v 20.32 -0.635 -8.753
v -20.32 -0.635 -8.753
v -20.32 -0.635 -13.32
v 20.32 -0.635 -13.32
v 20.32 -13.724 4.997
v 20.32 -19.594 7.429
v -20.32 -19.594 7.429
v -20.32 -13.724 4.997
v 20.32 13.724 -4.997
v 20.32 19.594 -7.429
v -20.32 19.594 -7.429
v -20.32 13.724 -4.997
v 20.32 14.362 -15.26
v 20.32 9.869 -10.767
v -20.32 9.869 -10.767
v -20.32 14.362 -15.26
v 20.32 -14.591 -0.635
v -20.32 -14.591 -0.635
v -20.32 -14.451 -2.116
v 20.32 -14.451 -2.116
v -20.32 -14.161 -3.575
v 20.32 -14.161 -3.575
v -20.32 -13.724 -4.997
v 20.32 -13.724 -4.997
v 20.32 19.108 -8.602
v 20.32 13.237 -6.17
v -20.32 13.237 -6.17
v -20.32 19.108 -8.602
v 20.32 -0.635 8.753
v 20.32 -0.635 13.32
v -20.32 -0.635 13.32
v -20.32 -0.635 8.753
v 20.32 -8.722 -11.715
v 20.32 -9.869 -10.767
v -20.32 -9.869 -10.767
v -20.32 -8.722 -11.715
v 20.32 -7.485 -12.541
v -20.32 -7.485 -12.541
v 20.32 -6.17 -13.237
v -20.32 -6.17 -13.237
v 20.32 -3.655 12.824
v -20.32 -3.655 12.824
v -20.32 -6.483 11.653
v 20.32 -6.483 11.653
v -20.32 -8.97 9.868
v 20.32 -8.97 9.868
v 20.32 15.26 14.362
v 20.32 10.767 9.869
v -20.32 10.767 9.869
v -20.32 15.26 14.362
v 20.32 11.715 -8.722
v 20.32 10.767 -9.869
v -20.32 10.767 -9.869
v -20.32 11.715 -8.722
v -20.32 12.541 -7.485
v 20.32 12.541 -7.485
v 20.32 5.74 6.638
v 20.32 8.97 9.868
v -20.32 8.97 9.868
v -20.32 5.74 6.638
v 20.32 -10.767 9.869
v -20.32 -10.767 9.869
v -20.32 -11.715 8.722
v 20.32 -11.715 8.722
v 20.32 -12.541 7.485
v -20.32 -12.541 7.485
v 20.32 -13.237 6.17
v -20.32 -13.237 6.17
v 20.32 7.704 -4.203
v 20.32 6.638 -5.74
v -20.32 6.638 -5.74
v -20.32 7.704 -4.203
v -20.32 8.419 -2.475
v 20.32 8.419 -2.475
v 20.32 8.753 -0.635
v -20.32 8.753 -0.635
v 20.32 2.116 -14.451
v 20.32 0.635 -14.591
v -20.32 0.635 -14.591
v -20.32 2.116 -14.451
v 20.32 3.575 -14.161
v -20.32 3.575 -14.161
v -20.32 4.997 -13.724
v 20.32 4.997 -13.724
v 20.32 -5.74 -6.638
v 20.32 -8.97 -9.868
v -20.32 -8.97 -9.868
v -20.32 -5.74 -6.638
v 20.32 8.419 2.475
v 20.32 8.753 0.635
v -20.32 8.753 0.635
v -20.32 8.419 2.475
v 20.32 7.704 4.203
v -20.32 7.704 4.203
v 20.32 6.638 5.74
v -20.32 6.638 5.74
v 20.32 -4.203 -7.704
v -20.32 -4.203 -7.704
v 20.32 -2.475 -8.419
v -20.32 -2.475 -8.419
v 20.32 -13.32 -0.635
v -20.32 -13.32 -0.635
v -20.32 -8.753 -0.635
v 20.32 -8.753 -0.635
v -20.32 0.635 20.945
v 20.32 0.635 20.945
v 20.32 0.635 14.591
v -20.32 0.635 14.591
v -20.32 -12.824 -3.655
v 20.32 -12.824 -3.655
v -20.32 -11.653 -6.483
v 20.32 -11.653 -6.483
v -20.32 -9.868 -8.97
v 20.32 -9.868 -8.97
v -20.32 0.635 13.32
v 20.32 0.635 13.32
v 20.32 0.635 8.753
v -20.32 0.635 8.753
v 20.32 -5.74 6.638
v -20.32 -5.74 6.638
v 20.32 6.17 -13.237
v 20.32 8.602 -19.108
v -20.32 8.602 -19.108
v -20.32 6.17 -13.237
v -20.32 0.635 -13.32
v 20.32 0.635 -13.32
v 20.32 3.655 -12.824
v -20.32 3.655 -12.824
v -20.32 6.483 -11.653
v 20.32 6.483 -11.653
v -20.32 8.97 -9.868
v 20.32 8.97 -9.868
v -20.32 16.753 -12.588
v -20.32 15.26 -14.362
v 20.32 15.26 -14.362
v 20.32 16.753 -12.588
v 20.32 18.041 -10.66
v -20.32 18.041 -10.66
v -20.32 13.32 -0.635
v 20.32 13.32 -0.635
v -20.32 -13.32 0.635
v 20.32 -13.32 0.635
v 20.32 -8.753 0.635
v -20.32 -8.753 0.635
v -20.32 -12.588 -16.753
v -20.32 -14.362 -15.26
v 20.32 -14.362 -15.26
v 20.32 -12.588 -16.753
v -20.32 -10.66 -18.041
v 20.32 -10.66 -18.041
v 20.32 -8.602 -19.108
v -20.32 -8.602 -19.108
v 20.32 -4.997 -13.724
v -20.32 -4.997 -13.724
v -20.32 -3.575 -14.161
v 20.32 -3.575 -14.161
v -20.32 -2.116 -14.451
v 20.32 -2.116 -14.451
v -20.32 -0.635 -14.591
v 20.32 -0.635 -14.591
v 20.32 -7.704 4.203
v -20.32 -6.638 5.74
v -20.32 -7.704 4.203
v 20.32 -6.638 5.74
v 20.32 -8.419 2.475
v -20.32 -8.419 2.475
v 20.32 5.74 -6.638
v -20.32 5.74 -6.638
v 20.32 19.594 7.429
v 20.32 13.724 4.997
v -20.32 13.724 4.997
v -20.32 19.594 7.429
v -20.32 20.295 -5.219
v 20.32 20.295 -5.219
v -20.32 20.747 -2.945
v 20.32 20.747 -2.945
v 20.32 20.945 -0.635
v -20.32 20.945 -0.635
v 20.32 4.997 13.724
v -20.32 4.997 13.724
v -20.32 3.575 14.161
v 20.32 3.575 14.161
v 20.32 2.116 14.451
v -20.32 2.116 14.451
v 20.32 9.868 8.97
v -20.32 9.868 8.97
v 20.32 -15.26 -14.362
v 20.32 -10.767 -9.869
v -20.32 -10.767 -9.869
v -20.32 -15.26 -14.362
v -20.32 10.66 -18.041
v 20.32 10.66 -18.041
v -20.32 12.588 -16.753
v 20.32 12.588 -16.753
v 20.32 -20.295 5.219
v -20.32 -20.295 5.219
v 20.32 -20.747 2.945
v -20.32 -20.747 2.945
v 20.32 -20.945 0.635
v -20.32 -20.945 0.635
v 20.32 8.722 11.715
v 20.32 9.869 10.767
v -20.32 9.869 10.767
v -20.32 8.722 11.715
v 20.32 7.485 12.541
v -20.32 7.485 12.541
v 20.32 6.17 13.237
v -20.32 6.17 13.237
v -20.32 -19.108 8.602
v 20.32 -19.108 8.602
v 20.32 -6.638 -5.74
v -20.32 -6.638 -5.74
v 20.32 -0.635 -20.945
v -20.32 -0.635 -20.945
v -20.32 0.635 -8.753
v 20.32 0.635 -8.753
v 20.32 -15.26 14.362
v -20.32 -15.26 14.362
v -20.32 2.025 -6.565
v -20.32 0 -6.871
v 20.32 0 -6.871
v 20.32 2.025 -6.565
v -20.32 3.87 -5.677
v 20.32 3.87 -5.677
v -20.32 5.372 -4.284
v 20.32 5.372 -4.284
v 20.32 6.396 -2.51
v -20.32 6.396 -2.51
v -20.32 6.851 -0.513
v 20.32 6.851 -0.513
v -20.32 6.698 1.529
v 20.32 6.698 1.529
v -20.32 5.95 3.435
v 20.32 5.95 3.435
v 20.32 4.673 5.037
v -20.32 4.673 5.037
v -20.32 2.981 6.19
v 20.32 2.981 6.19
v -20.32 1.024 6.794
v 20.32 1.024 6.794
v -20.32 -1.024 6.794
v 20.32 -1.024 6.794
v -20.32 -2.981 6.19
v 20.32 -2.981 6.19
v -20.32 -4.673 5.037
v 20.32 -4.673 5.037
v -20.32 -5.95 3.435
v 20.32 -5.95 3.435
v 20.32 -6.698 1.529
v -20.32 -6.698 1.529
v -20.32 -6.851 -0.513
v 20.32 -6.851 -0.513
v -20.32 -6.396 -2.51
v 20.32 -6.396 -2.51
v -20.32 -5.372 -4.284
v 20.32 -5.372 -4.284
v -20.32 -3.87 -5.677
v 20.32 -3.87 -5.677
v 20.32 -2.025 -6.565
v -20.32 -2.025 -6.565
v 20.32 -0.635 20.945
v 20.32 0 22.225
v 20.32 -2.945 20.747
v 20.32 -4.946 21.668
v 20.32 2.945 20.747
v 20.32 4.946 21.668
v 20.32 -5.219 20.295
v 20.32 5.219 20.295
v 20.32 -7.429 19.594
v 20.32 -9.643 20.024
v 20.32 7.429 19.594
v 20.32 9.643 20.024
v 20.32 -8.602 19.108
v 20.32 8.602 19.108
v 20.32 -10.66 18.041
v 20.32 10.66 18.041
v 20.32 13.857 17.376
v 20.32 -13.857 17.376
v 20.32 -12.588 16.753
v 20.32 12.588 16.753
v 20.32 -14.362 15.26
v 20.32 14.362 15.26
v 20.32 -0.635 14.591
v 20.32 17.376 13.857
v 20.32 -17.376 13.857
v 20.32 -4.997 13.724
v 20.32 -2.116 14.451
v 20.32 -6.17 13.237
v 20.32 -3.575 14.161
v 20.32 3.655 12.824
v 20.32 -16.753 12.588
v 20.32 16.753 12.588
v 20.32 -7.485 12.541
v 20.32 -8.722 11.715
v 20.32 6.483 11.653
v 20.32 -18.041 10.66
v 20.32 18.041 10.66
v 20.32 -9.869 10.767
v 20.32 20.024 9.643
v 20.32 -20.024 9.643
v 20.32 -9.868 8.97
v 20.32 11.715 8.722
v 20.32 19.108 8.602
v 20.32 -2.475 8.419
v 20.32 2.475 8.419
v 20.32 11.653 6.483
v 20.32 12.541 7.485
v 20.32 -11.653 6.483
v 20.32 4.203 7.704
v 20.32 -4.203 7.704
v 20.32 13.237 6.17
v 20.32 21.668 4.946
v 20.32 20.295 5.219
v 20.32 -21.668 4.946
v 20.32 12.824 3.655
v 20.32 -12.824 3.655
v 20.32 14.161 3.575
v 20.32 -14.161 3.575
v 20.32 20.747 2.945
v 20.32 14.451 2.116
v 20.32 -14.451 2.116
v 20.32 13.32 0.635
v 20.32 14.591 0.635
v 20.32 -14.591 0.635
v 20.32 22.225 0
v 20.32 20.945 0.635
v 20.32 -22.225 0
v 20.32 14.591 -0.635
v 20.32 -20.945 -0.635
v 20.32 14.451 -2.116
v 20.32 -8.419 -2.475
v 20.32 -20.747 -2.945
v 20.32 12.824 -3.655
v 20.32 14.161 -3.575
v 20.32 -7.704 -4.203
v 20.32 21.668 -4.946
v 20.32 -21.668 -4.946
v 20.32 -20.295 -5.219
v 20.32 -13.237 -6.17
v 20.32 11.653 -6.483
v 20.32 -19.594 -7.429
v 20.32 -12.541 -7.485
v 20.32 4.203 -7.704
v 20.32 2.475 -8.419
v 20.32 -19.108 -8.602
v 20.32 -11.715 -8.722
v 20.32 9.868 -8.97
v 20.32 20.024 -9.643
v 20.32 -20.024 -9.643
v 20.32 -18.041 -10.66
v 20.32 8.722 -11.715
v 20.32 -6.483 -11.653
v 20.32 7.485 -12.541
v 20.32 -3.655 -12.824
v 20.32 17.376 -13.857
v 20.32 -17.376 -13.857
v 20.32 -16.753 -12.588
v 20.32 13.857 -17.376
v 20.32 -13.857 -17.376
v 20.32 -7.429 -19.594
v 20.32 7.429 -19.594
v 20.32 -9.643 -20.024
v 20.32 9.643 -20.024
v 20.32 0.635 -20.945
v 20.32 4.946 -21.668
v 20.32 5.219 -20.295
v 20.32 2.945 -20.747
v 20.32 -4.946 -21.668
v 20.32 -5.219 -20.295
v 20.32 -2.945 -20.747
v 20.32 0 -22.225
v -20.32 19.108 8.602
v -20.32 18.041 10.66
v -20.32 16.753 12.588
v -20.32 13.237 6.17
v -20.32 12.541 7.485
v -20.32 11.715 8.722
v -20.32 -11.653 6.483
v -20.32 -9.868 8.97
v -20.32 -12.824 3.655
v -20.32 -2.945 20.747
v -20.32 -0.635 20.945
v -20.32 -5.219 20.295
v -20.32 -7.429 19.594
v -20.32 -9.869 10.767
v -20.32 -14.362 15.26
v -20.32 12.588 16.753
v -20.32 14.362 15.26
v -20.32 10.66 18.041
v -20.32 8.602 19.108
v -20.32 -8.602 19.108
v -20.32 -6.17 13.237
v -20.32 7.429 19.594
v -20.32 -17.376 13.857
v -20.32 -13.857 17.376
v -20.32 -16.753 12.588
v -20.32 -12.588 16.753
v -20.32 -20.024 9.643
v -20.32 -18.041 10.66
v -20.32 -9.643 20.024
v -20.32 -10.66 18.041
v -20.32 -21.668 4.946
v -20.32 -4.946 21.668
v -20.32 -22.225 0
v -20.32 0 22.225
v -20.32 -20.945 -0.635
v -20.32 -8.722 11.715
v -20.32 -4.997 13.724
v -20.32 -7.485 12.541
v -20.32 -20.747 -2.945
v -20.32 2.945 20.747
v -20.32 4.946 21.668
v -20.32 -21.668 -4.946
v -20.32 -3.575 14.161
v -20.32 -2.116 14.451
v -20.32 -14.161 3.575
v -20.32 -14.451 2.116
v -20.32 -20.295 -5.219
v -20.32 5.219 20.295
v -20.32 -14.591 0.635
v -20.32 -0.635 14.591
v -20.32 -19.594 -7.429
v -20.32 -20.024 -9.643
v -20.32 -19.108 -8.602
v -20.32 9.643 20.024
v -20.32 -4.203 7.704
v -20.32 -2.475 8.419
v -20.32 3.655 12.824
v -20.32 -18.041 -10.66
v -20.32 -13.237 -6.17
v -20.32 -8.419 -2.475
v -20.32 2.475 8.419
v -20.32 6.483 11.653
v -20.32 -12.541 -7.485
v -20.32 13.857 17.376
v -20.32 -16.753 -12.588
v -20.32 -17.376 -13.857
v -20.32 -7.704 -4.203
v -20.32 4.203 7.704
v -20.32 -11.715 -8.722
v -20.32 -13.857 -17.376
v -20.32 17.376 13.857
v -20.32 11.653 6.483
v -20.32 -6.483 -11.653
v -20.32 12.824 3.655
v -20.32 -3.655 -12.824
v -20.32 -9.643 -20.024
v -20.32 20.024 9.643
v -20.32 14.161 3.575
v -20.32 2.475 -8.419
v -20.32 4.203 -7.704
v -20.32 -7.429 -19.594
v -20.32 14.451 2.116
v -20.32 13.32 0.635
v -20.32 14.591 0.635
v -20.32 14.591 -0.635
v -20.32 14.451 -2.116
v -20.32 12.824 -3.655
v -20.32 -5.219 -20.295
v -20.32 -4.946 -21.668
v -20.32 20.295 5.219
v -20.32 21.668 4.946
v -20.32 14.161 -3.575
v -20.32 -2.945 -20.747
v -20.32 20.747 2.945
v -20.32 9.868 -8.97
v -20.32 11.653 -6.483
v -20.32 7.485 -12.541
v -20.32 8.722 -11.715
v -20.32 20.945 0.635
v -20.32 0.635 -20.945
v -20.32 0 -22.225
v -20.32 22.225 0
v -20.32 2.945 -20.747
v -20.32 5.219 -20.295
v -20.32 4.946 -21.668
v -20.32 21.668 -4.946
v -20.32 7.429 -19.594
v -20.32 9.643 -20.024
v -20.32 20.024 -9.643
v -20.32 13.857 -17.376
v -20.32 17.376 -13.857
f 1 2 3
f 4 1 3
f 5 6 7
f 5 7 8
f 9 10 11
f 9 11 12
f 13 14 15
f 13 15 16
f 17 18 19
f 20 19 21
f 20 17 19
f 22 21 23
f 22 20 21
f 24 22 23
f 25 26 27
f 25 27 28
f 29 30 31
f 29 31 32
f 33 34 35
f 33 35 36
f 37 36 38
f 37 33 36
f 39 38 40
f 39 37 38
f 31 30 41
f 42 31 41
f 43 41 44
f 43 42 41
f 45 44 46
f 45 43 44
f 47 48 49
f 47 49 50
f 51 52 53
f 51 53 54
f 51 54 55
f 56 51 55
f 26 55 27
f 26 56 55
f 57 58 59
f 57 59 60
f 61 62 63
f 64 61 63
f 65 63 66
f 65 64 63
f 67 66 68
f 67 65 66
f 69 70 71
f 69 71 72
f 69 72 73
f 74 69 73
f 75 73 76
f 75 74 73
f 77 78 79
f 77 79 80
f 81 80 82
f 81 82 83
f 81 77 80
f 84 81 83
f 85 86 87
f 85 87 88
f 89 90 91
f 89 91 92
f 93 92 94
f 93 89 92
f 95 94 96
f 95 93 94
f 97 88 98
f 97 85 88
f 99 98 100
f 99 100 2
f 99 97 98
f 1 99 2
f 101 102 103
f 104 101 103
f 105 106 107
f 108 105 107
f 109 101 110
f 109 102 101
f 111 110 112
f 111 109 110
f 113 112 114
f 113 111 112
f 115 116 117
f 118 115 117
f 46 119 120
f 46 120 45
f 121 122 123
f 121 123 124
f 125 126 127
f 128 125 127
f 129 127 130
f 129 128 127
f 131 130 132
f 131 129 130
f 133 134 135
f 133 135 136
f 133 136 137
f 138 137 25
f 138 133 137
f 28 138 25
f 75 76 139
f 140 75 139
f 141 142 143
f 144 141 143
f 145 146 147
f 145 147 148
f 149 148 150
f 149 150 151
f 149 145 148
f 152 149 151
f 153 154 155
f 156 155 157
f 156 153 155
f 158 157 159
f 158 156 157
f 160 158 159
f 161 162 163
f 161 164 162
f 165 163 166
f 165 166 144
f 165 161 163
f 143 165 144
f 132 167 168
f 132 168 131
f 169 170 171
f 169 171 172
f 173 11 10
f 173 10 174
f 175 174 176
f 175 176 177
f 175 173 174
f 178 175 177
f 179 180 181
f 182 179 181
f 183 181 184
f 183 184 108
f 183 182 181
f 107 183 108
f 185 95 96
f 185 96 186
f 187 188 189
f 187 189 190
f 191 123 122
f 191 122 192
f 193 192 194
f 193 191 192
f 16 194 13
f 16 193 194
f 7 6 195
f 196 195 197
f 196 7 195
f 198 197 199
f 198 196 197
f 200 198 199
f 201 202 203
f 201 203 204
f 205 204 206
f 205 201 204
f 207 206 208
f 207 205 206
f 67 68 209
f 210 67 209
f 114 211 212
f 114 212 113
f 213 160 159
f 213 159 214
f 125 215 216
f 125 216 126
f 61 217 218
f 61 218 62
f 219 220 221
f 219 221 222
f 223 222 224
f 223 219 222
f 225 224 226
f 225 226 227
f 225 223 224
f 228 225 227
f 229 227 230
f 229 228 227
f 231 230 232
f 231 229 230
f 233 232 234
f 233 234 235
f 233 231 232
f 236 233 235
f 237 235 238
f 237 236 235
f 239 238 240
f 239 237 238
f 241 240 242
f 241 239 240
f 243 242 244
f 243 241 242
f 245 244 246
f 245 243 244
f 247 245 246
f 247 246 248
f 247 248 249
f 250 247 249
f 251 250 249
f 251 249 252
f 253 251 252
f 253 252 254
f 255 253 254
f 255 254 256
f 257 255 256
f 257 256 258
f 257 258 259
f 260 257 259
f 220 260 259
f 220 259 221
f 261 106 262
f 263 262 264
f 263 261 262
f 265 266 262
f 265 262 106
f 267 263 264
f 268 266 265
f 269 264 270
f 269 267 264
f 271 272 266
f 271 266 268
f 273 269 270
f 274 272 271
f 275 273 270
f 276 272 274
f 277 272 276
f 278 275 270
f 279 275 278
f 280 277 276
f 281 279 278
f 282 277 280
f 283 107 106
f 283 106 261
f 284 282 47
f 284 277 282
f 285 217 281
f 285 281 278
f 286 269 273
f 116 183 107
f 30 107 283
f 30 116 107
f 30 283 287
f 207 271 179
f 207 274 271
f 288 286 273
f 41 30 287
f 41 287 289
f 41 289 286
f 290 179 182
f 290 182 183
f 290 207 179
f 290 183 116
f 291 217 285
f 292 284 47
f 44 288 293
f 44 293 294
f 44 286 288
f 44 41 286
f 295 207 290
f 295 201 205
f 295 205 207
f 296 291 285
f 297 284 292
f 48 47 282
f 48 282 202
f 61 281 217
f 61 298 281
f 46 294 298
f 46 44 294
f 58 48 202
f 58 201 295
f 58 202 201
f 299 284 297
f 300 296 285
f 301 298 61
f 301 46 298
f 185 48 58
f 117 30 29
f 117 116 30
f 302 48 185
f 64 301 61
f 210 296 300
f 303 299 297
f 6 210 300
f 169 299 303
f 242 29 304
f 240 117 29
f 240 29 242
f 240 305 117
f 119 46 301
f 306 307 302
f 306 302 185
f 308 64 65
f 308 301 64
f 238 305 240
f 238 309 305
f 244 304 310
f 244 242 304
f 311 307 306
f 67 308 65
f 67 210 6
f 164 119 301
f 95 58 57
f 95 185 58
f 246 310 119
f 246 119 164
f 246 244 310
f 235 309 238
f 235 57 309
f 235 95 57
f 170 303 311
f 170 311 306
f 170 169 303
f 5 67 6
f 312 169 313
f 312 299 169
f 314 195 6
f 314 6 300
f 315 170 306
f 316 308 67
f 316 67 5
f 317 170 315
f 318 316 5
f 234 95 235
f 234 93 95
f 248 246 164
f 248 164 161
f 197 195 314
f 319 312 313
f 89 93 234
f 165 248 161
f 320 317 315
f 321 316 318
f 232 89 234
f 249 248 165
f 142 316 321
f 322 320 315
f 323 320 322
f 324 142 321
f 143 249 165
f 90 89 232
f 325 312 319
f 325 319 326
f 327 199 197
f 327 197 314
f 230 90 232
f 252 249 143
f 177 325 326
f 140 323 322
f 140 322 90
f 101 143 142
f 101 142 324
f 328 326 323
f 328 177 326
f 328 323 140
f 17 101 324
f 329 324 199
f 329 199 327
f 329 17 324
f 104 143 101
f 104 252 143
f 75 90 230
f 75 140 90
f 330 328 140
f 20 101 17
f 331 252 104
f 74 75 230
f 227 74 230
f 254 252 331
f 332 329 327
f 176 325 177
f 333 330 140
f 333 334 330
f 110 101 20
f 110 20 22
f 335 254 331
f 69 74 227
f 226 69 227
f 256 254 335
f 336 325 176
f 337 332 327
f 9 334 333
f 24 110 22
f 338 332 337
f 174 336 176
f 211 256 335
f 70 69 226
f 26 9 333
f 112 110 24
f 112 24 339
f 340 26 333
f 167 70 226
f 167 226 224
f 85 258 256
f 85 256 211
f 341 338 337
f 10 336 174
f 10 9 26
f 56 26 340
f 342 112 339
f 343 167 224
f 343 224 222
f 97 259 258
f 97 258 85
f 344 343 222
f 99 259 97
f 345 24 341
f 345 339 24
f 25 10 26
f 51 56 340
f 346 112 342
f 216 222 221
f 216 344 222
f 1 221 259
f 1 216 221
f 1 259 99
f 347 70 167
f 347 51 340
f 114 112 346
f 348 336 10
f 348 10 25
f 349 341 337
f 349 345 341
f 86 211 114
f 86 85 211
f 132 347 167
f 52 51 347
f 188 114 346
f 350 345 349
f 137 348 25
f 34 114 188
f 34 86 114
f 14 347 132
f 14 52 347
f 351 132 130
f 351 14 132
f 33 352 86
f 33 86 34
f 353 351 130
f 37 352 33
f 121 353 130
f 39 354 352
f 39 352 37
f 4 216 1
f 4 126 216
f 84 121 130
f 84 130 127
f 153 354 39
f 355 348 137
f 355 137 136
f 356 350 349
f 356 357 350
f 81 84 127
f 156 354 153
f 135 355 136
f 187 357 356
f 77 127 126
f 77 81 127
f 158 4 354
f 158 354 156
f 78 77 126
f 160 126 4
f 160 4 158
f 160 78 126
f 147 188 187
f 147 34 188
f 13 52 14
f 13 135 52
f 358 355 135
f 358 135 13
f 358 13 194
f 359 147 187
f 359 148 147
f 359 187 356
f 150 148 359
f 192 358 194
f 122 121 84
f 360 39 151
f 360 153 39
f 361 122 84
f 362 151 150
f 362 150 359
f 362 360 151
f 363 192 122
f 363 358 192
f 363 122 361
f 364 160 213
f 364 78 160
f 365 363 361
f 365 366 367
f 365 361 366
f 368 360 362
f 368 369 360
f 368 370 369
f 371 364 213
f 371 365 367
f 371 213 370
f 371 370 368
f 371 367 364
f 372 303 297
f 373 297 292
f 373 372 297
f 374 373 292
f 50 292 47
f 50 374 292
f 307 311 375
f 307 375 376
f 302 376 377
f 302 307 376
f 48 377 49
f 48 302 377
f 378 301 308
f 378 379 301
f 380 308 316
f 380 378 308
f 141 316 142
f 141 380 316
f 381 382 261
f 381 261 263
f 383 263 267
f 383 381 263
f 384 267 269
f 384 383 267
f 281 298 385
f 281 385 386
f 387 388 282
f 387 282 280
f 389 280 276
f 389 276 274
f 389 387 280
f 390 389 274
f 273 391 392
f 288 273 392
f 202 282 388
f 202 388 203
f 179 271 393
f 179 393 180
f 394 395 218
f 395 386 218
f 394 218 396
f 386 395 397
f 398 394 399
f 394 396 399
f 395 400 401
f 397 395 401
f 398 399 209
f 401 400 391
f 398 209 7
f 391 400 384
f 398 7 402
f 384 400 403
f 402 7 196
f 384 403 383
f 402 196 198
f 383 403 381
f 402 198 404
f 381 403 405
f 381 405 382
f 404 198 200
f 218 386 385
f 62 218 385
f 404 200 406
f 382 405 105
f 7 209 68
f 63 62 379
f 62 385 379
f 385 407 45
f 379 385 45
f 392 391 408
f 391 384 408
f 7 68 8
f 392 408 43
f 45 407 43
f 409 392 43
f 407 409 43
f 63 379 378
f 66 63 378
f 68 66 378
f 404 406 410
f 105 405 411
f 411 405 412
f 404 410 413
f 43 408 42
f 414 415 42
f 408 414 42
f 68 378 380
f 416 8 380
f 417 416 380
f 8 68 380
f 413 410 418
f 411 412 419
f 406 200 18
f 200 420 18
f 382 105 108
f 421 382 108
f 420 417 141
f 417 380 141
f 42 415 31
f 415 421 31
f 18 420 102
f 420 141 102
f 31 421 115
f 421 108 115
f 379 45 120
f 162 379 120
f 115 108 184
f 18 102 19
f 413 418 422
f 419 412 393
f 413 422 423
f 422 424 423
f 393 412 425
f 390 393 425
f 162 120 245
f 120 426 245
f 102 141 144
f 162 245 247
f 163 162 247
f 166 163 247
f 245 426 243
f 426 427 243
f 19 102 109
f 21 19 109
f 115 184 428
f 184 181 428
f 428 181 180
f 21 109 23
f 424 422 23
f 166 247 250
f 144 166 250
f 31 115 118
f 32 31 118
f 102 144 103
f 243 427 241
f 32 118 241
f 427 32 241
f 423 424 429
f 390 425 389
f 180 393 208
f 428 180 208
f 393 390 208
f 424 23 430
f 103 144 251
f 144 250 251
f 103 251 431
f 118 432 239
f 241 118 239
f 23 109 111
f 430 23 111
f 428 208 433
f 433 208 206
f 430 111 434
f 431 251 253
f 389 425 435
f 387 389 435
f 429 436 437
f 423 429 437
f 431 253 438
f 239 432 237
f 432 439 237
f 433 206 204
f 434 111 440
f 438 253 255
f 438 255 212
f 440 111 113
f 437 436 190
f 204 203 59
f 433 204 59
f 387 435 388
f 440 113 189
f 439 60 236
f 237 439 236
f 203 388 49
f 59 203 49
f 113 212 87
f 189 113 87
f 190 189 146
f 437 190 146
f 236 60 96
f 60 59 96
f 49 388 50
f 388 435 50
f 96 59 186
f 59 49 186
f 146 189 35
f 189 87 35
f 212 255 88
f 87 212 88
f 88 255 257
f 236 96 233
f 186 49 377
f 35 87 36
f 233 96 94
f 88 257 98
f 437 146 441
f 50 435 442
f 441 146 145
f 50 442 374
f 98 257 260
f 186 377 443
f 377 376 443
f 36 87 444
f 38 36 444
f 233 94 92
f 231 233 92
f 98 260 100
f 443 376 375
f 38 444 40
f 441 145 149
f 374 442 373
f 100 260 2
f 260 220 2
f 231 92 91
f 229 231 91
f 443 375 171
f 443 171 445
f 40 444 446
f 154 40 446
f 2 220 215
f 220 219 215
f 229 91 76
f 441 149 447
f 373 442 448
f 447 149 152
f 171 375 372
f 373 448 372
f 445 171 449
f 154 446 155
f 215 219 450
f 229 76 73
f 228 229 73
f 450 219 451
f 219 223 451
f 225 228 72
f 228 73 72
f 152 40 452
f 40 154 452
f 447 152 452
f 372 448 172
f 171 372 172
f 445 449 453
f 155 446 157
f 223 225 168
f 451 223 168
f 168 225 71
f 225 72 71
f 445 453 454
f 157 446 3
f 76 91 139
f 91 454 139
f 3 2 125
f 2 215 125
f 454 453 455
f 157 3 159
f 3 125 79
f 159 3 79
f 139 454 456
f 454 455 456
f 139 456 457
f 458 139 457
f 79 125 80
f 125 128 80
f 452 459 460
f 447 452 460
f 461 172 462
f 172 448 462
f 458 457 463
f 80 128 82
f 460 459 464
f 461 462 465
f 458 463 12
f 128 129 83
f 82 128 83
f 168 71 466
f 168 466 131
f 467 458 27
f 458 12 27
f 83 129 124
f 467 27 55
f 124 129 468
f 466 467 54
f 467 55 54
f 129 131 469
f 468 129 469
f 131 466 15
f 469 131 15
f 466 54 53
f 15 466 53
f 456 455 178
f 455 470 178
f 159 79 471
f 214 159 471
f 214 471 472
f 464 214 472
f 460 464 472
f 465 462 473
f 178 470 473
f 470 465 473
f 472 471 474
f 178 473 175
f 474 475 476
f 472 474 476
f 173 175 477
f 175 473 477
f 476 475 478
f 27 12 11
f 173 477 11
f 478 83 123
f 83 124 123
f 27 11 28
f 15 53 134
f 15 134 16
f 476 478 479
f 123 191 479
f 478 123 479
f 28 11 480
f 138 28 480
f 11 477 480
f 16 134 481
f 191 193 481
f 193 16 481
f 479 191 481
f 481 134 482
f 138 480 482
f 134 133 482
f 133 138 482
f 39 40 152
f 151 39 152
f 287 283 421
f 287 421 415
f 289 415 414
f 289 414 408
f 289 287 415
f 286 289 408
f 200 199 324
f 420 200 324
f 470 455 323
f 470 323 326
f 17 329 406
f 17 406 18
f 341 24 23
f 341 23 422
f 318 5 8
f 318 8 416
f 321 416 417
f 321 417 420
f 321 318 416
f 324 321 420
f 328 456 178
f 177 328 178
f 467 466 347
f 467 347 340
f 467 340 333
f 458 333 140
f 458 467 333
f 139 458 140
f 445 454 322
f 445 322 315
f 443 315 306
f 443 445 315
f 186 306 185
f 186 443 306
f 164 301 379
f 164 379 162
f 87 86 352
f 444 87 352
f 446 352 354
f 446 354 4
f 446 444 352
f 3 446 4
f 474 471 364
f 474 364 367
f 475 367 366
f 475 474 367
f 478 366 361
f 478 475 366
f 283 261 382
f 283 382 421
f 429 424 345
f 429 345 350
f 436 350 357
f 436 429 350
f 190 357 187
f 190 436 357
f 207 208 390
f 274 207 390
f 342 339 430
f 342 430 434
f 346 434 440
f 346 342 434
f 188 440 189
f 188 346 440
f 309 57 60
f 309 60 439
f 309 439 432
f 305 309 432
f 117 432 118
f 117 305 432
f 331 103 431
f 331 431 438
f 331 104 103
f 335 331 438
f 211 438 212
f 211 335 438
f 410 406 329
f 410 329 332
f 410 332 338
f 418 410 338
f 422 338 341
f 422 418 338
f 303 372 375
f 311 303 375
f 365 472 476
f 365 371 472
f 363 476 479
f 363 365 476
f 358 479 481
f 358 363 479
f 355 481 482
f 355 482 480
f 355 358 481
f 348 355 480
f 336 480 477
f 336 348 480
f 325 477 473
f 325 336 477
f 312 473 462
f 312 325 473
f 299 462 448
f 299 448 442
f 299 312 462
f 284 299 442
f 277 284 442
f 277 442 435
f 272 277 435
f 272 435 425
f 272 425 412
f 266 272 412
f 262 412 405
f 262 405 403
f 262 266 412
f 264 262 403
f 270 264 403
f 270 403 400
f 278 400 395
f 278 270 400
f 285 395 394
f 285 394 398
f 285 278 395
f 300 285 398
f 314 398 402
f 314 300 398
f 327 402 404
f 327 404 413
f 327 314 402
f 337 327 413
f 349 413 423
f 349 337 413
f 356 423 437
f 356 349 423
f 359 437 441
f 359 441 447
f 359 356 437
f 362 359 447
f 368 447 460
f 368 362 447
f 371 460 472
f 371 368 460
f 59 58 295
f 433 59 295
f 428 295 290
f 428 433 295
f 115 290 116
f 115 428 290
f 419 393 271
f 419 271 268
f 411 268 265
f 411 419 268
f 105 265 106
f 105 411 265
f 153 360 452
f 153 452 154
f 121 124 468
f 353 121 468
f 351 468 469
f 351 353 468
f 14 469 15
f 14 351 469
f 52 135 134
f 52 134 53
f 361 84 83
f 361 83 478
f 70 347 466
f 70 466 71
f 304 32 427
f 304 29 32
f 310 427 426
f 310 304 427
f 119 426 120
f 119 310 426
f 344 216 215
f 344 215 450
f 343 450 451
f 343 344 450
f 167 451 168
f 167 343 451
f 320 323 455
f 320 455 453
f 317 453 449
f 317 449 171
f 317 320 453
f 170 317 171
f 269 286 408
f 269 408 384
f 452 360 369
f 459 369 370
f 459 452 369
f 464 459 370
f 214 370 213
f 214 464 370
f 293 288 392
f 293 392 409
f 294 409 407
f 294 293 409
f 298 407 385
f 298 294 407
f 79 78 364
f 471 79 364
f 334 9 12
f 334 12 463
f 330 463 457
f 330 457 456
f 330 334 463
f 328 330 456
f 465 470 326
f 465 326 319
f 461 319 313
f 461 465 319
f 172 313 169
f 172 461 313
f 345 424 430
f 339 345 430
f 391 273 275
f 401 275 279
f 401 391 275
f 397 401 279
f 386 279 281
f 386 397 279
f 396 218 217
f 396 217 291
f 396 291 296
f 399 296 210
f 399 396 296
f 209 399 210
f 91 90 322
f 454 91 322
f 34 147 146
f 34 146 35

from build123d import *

# Parameters (mm, degrees)
SKETCH1_R             = 22.225
SKETCH1_R_2           = 20.955
EXTRUDE_THIN1_DEPTH   = 20.32
SKETCH1_R_3           = 14.605
SKETCH1_R_4           = 13.335
EXTRUDE_THIN1_2_DEPTH = 20.32
SKETCH1_3_R           = 8.7757
SKETCH1_3_R_2         = 6.8707
EXTRUDE_THIN2_DEPTH   = 20.32
SKETCH2_W             = 1.27
SKETCH2_H             = 41.91
SKETCH2_W_2           = 41.91
SKETCH2_H_2           = 1.27
EXTRUDE_THIN3_DEPTH   = 20.32
SKETCH1_5_R           = 6.8707
CUT_EXTRUDE1_DEPTH    = 20.32
EXTRUDE_THIN6_DEPTH   = 20.32
CIRPATTERN1_COUNT     = 8


with BuildPart() as part:
    # Sketch1 → Extrude-Thin1 (new body, symmetric)
    with BuildSketch(Plane(origin=(0, 0, 0), x_dir=(0, 0, -1), z_dir=(1, 0, 0))):
        Circle(SKETCH1_R)
        Circle(SKETCH1_R_2, mode=Mode.SUBTRACT)
    extrude(amount=EXTRUDE_THIN1_DEPTH, both=True)



with BuildPart() as body_2:
    # Sketch1 → Extrude-Thin1 2 (new body, symmetric)
    with BuildSketch(Plane(origin=(0, 0, 0), x_dir=(0, 0, -1), z_dir=(1, 0, 0))):
        Circle(SKETCH1_R_3)
        Circle(SKETCH1_R_4, mode=Mode.SUBTRACT)
    extrude(amount=EXTRUDE_THIN1_2_DEPTH, both=True)


with BuildPart() as body_3:
    # Sketch1<3> → Extrude-Thin2 (new body, symmetric)
    with BuildSketch(Plane(origin=(0, 0, 0), x_dir=(0, 0, -1), z_dir=(1, 0, 0))):
        Circle(SKETCH1_3_R)
        Circle(SKETCH1_3_R_2, mode=Mode.SUBTRACT)
    extrude(amount=EXTRUDE_THIN2_DEPTH, both=True)


with BuildPart() as part_1:
    add(part.part)

    add(body_3.part)  # Extrude-Thin3 merges body 3
    # Sketch2 → Extrude-Thin3 (add, symmetric)
    with BuildSketch(Plane(origin=(0, 0, 0), x_dir=(0, 0, -1), z_dir=(1, 0, 0))):
        Rectangle(SKETCH2_W, SKETCH2_H)
        Rectangle(SKETCH2_W_2, SKETCH2_H_2)
        Polygon((-14.368409794, -15.266435406), (15.266435406, 14.368409794), (14.368409794, 15.266435406), (-15.266435406, -14.368409794), align=None)
        Polygon((-15.266435406, 14.368409794), (14.368409794, -15.266435406), (15.266435406, -14.368409794), (-14.368409794, 15.266435406), align=None)
    extrude(amount=EXTRUDE_THIN3_DEPTH, both=True)

    # Sketch1<5> → Cut-Extrude1 (cut, symmetric)
    with BuildSketch(Plane(origin=(0, 0, 0), x_dir=(0, 0, -1), z_dir=(1, 0, 0))):
        Circle(SKETCH1_5_R)
    extrude(amount=CUT_EXTRUDE1_DEPTH, both=True, mode=Mode.SUBTRACT)


    add(body_2.part)  # Extrude-Thin6 merges body 2
    # Sketch4 → Extrude-Thin6 (add, symmetric)
    with BuildSketch(Plane(origin=(0, 0, 0), x_dir=(0, 0, -1), z_dir=(1, 0, 0))):
        Polygon((-8.605794828, 19.116891624), (-5.981351849, 12.78092579), (-4.808024843, 13.266933749), (-7.432467822, 19.602899583), align=None)
    extrude_thin6 = extrude(amount=EXTRUDE_THIN6_DEPTH, both=True)

    # CirPattern1: Extrude-Thin6 ×8 about axis
    cirpattern1_axis = Axis((0, 0, 0), (1, 0, 0))
    for i in range(1, CIRPATTERN1_COUNT):
        add(extrude_thin6.rotate(cirpattern1_axis, i * 360 / CIRPATTERN1_COUNT))


solid = part_1.part
